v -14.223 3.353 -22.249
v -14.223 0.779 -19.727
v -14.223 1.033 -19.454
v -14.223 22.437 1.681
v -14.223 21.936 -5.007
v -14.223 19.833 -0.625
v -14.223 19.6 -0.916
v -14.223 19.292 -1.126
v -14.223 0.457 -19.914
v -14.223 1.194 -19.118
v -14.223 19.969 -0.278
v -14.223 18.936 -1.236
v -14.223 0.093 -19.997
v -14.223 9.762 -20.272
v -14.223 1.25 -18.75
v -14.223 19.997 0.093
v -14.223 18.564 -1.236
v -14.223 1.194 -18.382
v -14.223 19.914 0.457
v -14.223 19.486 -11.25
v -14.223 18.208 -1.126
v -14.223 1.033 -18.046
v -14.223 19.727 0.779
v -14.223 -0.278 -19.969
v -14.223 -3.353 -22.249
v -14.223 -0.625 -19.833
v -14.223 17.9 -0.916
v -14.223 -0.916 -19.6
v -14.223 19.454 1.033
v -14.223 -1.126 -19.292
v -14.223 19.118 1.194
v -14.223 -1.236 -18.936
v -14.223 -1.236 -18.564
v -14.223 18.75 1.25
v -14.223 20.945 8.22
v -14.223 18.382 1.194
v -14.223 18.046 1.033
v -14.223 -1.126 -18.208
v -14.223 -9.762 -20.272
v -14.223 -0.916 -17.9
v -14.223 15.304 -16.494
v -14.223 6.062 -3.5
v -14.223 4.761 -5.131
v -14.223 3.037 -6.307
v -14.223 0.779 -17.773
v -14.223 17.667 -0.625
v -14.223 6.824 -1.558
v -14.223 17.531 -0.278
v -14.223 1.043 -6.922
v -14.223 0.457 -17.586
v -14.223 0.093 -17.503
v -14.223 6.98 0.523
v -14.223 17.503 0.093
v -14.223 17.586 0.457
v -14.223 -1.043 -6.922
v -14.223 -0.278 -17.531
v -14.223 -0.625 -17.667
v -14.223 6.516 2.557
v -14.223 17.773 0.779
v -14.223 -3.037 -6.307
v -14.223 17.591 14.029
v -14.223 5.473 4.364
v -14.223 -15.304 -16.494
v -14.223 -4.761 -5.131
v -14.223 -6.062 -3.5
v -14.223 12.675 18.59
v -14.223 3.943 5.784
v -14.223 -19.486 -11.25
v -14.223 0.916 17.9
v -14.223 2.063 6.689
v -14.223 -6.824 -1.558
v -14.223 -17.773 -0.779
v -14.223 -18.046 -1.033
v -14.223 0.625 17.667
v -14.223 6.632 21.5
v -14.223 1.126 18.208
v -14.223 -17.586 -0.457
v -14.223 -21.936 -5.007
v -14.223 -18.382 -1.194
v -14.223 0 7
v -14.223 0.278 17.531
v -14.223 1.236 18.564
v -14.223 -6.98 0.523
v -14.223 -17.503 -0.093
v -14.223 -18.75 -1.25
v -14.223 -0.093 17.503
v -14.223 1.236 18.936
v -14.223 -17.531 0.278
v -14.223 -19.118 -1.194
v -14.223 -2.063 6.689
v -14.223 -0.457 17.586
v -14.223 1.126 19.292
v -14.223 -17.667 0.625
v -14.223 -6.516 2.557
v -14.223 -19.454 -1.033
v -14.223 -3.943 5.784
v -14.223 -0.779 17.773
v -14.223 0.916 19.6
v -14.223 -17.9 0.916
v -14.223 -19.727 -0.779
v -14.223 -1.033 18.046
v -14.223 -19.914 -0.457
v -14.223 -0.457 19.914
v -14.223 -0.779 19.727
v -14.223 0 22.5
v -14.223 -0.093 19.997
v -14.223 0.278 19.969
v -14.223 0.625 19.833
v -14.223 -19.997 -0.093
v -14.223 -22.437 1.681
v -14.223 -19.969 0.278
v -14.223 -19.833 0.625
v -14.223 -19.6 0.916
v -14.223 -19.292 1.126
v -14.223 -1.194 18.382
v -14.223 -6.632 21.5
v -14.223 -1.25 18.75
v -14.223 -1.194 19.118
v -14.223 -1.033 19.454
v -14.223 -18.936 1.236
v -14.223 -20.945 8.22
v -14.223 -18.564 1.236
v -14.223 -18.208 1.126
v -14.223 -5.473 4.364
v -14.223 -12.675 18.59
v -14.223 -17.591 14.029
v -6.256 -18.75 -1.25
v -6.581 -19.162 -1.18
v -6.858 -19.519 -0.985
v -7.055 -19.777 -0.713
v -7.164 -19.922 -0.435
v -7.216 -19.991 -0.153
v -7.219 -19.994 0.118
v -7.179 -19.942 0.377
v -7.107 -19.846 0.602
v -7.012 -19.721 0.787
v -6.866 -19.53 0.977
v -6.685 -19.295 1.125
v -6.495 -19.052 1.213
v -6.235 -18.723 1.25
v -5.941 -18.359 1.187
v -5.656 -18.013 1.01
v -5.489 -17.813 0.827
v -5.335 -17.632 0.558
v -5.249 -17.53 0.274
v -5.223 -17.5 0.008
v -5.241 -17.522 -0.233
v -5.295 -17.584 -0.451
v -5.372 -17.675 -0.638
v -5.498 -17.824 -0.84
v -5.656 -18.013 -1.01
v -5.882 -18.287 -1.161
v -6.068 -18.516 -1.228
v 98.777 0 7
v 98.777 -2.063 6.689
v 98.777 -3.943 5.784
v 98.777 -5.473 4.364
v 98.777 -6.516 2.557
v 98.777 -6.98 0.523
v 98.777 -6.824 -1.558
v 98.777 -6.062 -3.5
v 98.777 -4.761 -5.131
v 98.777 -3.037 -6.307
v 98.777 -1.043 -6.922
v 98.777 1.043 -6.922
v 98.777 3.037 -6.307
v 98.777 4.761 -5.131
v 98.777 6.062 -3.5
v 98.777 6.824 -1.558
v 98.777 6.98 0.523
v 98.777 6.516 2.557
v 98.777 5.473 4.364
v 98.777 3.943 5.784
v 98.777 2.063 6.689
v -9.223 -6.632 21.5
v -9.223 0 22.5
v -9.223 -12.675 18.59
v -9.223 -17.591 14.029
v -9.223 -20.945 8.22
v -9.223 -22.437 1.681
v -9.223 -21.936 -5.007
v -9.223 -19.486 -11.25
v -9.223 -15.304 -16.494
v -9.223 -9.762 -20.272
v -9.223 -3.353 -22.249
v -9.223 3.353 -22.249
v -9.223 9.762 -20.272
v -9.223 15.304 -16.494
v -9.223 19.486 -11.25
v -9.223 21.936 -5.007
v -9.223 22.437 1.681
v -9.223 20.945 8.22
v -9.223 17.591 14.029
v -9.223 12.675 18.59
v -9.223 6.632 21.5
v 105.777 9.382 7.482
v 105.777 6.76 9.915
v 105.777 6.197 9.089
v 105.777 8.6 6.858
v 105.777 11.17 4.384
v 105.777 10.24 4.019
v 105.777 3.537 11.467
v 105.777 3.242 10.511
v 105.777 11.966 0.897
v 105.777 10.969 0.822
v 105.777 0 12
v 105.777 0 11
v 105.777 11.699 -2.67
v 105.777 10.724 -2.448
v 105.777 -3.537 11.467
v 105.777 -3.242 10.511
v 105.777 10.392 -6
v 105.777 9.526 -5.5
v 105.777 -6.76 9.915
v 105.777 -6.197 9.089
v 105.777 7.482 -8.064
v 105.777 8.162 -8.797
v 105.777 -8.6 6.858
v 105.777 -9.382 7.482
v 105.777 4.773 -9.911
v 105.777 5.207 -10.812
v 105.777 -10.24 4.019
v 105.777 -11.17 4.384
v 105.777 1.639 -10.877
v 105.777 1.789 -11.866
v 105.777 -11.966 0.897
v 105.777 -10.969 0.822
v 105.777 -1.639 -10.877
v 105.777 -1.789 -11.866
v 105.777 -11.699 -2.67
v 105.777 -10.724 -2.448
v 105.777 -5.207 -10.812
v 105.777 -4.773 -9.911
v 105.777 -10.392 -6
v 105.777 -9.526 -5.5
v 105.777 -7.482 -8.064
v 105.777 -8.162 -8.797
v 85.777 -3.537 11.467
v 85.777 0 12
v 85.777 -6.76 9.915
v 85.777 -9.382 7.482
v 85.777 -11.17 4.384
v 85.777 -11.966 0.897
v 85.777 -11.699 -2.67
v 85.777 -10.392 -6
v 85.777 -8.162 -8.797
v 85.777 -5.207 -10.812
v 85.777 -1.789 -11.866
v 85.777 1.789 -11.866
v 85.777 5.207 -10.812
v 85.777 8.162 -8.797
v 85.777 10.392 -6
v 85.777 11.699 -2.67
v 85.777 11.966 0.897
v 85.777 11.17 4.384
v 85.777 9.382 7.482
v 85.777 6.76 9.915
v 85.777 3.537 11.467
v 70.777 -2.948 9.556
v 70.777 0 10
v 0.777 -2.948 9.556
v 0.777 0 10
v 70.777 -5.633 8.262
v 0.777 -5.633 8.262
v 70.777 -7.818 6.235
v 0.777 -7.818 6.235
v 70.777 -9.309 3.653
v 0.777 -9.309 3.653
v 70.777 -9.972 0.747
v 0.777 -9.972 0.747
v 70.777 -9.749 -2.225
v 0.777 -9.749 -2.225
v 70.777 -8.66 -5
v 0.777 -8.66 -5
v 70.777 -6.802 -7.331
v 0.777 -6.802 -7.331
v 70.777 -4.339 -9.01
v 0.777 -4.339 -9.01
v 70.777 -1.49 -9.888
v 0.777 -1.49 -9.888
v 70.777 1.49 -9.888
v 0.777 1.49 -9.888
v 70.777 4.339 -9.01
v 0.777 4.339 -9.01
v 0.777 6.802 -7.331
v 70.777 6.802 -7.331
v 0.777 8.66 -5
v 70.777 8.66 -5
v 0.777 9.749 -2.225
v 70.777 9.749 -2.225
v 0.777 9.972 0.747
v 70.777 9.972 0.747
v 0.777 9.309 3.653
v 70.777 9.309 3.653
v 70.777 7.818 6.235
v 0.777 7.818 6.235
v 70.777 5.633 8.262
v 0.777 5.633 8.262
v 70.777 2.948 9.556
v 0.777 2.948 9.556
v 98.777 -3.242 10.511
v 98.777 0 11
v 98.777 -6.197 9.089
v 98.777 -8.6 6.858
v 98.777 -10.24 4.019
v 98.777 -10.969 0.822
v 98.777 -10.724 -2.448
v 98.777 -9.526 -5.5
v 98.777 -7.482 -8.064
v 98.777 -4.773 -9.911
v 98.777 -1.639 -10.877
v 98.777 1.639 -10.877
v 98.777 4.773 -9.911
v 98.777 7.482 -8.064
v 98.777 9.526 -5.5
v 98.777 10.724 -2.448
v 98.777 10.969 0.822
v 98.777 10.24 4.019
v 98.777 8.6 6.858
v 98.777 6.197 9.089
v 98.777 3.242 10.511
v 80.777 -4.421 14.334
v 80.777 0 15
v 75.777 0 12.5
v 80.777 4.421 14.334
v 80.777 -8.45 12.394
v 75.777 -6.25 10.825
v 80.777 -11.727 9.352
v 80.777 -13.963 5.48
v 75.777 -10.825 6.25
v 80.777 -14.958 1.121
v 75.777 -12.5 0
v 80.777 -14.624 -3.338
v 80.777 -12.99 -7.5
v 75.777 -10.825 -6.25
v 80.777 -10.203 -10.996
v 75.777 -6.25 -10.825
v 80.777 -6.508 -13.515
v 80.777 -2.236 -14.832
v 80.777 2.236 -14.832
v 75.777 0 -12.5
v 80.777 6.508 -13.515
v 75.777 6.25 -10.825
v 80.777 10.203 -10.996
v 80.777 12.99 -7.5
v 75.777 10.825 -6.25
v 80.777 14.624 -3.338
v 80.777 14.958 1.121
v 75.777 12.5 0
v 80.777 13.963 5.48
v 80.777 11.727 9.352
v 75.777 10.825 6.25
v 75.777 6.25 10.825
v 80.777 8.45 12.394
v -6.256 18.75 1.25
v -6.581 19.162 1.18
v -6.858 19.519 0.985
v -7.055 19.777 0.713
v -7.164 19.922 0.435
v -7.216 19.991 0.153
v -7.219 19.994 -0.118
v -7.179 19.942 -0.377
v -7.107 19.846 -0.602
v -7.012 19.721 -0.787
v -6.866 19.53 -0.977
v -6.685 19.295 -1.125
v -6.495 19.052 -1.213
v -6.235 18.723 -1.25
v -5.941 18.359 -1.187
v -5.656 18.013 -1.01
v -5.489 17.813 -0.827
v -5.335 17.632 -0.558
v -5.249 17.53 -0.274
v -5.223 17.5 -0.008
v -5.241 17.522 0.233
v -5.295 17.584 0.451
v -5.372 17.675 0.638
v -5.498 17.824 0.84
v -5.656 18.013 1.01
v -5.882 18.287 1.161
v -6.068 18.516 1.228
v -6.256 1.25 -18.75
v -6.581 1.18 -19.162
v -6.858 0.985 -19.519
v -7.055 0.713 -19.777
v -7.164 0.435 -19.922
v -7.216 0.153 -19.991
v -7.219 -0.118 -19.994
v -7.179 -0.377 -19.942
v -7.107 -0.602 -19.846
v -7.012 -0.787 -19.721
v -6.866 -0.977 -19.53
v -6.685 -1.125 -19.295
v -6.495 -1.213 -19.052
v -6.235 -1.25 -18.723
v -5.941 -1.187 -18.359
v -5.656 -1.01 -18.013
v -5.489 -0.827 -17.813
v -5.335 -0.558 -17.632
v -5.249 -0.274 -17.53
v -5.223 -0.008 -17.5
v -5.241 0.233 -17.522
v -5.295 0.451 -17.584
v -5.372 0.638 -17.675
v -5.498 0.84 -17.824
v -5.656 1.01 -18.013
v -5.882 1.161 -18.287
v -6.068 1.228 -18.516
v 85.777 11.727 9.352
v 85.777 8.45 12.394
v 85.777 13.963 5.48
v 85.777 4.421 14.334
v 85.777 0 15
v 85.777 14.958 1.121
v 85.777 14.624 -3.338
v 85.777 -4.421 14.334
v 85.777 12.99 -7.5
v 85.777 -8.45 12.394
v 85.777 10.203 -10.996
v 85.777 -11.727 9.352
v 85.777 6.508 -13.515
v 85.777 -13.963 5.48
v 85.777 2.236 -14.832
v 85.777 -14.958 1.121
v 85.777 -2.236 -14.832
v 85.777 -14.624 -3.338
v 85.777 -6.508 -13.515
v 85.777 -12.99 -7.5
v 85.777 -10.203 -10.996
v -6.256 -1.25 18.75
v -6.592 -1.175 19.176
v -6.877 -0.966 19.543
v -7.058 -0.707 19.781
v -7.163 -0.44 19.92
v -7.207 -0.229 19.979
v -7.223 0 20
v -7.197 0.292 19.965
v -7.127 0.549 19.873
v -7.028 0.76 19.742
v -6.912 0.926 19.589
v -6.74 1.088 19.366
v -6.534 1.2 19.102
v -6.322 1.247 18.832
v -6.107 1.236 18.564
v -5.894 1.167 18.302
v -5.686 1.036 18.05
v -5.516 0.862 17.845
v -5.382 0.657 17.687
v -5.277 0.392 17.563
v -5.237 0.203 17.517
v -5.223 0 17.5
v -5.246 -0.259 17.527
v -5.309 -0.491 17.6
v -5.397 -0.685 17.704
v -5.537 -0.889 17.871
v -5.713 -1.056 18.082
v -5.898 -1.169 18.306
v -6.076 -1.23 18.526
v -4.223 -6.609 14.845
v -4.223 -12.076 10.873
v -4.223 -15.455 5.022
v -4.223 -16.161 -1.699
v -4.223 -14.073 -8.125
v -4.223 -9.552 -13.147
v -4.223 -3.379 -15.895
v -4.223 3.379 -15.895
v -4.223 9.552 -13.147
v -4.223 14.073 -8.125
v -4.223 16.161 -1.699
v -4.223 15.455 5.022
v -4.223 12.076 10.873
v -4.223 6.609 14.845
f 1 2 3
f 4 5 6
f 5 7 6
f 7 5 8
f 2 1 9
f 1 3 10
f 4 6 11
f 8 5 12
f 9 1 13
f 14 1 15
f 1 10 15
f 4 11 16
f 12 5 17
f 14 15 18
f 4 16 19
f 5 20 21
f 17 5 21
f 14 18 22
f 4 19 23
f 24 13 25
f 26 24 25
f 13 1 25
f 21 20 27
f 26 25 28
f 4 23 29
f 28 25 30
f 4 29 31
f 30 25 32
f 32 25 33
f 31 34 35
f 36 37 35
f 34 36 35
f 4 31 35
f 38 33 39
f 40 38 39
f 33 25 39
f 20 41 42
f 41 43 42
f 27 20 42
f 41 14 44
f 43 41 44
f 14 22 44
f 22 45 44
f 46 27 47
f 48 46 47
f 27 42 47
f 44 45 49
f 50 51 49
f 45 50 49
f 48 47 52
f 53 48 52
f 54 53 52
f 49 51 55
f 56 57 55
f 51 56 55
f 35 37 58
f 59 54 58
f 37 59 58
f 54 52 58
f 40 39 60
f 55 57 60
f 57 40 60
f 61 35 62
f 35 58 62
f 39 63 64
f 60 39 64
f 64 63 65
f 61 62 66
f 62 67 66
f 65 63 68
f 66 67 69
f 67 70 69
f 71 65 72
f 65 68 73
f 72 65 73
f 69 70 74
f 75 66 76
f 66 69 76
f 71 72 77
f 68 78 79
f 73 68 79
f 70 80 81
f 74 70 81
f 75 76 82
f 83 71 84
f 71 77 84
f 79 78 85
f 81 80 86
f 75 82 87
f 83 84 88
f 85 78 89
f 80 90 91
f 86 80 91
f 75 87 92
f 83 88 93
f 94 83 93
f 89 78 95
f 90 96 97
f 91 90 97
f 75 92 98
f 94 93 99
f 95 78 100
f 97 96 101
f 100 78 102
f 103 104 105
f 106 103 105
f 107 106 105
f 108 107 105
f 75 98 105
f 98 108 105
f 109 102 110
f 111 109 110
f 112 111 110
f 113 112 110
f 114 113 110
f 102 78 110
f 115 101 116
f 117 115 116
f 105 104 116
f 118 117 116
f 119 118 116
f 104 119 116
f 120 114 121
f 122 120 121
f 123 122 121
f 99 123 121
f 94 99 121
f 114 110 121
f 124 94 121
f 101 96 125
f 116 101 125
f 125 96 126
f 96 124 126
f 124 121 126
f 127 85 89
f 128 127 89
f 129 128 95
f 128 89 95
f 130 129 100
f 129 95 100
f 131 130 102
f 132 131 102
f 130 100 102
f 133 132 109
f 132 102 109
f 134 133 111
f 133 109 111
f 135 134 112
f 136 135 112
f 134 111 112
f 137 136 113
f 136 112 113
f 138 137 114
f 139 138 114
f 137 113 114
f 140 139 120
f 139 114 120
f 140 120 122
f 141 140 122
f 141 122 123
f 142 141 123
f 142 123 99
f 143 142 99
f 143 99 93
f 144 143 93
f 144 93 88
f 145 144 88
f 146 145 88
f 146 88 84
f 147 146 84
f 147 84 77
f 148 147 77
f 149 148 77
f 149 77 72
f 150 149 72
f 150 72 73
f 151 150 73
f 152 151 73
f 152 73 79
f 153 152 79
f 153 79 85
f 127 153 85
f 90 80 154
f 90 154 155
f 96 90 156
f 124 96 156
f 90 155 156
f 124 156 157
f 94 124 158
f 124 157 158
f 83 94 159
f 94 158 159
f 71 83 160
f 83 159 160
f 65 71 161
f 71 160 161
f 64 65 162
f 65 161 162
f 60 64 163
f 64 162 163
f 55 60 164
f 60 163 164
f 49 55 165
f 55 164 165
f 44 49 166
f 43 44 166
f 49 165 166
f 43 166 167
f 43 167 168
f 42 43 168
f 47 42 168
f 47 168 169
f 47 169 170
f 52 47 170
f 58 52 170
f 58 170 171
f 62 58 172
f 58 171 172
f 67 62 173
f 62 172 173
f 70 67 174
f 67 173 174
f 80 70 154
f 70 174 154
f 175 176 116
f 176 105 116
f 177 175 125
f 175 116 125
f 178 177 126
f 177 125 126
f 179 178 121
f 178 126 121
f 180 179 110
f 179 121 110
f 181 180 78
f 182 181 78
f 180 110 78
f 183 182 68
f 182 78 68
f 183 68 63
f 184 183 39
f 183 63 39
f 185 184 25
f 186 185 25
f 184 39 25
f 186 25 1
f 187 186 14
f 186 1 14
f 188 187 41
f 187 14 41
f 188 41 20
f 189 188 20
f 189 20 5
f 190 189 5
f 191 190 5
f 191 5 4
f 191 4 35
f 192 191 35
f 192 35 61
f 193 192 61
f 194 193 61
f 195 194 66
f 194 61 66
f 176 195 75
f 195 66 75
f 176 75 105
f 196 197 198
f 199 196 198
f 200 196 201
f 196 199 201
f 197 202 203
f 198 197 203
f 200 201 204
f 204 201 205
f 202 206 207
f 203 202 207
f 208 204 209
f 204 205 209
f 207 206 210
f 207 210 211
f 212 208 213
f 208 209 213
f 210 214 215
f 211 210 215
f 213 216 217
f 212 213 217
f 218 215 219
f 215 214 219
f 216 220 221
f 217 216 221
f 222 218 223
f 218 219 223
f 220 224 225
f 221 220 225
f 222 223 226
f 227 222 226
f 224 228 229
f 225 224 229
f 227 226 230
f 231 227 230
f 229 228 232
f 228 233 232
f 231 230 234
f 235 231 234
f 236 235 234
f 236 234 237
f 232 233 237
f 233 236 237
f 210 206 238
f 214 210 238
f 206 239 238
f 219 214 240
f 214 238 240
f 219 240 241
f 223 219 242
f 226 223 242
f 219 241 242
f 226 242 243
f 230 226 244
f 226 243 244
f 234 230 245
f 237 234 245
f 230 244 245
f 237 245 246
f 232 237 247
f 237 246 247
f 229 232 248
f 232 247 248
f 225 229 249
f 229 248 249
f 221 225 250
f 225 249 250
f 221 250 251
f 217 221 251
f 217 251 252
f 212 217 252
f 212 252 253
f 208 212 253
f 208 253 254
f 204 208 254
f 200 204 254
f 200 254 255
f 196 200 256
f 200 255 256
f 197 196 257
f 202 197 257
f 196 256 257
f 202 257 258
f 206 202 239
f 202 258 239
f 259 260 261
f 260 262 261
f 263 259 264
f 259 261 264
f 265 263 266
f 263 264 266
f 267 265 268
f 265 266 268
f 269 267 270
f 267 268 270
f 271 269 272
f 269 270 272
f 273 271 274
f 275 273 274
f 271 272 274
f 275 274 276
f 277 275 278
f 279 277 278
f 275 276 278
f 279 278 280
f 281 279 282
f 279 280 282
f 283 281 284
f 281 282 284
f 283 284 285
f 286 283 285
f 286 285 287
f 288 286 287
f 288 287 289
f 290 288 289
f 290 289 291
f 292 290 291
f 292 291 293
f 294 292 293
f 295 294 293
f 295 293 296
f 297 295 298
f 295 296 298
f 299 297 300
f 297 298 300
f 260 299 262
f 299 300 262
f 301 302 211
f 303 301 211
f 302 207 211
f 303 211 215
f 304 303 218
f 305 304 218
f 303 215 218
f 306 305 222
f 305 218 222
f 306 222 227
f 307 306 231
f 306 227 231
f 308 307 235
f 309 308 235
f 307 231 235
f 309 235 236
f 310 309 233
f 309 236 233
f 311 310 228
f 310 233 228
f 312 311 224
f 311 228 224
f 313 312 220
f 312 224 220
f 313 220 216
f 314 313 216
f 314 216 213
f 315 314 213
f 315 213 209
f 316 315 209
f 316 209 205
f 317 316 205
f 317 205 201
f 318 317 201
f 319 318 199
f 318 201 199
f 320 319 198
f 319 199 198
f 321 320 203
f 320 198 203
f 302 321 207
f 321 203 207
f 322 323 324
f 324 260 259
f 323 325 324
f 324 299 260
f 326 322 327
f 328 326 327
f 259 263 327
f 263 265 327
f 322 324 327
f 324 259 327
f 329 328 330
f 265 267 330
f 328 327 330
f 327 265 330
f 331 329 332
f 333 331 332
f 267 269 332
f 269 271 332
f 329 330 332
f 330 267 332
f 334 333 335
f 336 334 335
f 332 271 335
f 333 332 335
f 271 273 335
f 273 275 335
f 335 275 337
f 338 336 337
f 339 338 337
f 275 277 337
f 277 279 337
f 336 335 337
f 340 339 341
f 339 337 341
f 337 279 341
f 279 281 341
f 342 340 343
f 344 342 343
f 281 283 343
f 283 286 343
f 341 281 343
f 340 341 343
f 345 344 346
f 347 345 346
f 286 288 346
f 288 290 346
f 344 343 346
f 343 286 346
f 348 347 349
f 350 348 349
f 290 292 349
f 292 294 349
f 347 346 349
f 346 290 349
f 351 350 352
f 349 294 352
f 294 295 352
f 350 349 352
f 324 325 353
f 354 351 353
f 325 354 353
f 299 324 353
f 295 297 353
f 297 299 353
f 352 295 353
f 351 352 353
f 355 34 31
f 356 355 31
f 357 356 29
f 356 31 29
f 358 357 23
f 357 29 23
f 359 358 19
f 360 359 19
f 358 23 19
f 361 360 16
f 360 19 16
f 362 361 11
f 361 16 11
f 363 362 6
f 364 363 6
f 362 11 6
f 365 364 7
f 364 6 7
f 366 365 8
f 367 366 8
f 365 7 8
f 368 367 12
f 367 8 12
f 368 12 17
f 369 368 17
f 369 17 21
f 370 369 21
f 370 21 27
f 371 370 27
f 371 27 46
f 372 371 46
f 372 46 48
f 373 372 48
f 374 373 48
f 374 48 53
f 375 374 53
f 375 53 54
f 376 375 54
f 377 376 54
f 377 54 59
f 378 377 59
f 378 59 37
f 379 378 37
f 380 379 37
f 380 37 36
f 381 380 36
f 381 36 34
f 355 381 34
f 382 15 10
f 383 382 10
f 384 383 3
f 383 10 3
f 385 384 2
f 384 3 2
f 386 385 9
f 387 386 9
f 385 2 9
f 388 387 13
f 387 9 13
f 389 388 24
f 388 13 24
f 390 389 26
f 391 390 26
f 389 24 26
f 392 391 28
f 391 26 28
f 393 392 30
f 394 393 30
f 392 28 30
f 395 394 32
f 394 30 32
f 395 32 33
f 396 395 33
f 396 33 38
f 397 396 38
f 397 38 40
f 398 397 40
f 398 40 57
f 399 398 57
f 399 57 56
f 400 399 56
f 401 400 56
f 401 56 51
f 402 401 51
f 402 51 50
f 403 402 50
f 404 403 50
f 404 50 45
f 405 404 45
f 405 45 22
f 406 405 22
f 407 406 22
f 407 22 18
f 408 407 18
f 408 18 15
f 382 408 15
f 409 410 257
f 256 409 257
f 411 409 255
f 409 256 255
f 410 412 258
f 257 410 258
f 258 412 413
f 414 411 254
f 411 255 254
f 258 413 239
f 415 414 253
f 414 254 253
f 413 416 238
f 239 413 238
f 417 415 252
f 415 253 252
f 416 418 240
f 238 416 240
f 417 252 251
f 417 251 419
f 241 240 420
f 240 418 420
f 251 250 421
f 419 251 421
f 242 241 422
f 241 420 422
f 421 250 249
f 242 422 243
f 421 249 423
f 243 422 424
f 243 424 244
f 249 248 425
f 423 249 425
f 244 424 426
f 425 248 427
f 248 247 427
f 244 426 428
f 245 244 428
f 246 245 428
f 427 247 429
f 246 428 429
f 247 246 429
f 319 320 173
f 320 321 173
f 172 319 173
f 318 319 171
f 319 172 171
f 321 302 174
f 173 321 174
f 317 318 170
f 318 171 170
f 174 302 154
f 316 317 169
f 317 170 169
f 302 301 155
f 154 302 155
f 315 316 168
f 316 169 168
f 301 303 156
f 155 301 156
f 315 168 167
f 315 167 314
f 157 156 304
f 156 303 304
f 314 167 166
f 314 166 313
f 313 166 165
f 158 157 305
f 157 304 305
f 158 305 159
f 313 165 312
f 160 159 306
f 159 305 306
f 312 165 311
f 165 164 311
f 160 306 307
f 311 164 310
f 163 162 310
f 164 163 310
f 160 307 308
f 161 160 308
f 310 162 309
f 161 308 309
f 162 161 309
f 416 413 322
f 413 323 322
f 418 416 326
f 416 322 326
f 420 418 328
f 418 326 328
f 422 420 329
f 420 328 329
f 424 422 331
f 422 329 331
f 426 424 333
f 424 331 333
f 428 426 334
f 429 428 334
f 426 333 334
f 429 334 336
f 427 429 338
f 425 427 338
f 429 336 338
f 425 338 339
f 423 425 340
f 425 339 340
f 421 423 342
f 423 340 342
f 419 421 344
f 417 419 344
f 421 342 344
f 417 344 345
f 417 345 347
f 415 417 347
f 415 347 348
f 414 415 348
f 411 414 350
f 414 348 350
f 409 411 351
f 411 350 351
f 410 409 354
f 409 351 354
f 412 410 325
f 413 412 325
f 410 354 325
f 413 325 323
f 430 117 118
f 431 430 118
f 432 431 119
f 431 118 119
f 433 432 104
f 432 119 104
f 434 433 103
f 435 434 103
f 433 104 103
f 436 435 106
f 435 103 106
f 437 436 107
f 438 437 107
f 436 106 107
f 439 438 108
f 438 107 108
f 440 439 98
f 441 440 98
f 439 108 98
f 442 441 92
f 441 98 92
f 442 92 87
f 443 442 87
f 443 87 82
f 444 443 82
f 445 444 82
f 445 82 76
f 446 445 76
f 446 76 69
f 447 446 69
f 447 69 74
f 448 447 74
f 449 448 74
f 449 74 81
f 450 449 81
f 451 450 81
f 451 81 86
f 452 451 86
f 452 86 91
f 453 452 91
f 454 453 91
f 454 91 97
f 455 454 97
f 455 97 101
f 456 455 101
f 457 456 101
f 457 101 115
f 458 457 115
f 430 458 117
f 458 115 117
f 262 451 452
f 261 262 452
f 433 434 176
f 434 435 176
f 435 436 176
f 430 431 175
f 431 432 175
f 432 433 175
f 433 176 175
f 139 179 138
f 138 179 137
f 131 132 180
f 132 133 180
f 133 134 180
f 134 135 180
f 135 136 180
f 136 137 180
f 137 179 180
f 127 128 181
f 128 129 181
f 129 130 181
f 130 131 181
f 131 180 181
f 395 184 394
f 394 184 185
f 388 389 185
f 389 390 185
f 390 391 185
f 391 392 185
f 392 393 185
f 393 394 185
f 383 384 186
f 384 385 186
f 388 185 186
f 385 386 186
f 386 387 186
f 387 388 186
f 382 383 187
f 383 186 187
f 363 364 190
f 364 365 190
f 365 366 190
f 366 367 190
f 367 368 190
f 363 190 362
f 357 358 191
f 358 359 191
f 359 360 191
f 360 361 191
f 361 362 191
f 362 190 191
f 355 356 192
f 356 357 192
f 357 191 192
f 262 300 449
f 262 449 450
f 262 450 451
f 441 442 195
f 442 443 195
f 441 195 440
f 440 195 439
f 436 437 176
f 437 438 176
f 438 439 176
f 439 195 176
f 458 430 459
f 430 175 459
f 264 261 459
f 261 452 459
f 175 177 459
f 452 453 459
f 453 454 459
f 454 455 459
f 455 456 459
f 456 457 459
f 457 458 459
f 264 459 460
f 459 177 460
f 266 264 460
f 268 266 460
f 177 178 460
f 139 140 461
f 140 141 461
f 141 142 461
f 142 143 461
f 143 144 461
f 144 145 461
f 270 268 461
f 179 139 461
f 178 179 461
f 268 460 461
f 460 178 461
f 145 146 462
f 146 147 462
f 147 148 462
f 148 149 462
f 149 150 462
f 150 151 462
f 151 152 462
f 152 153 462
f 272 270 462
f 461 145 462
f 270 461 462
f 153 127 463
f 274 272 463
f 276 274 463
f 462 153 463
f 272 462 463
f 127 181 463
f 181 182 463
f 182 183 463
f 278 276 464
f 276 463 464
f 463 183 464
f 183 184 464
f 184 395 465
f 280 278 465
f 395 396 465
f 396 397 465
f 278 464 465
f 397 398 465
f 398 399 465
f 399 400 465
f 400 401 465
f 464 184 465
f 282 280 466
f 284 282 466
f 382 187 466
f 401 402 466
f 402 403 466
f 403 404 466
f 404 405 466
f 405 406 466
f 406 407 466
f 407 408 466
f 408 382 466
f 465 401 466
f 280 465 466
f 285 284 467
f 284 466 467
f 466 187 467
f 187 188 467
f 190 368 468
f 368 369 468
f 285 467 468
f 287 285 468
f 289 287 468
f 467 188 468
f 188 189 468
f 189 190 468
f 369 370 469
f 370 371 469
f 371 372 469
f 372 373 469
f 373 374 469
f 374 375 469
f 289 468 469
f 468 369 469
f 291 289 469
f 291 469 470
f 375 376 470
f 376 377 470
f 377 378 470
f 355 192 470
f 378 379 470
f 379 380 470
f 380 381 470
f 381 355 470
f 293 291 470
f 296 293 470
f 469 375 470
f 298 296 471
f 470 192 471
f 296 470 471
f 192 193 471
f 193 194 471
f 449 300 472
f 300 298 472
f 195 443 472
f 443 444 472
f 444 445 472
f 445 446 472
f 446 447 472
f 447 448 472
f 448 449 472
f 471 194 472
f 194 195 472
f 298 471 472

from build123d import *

# Parameters (mm, degrees)
IZIM3_R                 = 1.25
KES_EKSTR_ZYON1_DEPTH   = 10
DAIRESEL_KAPLAMA2_COUNT = 4


with BuildPart() as part:
    # Çizim2 → Döndür1 (revolve)
    with BuildSketch(Plane.XY, mode=Mode.PRIVATE) as d_nd_r1_sk:
        Polygon((-14.222748097, 7), (98.777251903, 7), (98.777251903, 11), (105.777251903, 11), (105.777251903, 12), (85.777251903, 12), (85.777251903, 15), (80.777251903, 15), (70.777251903, 10), (0.777251903, 10), (-9.222748097, 22.5), (-14.222748097, 22.5), align=None)
    revolve(d_nd_r1_sk.sketch.rotate(Axis((0, 0, 0), (1, 0, 0)), 90), axis=Axis((0, 0, 0), (1, 0, 0)))

    # Çizim3 → Kes-Ekstrüzyon1 (cut)
    with BuildSketch(Plane.ZY.offset(14.222748097)):
        with Locations((0, 18.75)):
            Circle(IZIM3_R)
    kes_ekstr_zyon1 = extrude(amount=-KES_EKSTR_ZYON1_DEPTH, mode=Mode.SUBTRACT)

    # Dairesel Kaplama2: Kes-Ekstrüzyon1 ×4 about axis
    dairesel_kaplama2_axis = Axis((0, 0, 0), (1, 0, 0))
    for i in range(1, DAIRESEL_KAPLAMA2_COUNT):
        add(kes_ekstr_zyon1.rotate(dairesel_kaplama2_axis, i * 360 / DAIRESEL_KAPLAMA2_COUNT), mode=Mode.SUBTRACT)


solid = part.part
